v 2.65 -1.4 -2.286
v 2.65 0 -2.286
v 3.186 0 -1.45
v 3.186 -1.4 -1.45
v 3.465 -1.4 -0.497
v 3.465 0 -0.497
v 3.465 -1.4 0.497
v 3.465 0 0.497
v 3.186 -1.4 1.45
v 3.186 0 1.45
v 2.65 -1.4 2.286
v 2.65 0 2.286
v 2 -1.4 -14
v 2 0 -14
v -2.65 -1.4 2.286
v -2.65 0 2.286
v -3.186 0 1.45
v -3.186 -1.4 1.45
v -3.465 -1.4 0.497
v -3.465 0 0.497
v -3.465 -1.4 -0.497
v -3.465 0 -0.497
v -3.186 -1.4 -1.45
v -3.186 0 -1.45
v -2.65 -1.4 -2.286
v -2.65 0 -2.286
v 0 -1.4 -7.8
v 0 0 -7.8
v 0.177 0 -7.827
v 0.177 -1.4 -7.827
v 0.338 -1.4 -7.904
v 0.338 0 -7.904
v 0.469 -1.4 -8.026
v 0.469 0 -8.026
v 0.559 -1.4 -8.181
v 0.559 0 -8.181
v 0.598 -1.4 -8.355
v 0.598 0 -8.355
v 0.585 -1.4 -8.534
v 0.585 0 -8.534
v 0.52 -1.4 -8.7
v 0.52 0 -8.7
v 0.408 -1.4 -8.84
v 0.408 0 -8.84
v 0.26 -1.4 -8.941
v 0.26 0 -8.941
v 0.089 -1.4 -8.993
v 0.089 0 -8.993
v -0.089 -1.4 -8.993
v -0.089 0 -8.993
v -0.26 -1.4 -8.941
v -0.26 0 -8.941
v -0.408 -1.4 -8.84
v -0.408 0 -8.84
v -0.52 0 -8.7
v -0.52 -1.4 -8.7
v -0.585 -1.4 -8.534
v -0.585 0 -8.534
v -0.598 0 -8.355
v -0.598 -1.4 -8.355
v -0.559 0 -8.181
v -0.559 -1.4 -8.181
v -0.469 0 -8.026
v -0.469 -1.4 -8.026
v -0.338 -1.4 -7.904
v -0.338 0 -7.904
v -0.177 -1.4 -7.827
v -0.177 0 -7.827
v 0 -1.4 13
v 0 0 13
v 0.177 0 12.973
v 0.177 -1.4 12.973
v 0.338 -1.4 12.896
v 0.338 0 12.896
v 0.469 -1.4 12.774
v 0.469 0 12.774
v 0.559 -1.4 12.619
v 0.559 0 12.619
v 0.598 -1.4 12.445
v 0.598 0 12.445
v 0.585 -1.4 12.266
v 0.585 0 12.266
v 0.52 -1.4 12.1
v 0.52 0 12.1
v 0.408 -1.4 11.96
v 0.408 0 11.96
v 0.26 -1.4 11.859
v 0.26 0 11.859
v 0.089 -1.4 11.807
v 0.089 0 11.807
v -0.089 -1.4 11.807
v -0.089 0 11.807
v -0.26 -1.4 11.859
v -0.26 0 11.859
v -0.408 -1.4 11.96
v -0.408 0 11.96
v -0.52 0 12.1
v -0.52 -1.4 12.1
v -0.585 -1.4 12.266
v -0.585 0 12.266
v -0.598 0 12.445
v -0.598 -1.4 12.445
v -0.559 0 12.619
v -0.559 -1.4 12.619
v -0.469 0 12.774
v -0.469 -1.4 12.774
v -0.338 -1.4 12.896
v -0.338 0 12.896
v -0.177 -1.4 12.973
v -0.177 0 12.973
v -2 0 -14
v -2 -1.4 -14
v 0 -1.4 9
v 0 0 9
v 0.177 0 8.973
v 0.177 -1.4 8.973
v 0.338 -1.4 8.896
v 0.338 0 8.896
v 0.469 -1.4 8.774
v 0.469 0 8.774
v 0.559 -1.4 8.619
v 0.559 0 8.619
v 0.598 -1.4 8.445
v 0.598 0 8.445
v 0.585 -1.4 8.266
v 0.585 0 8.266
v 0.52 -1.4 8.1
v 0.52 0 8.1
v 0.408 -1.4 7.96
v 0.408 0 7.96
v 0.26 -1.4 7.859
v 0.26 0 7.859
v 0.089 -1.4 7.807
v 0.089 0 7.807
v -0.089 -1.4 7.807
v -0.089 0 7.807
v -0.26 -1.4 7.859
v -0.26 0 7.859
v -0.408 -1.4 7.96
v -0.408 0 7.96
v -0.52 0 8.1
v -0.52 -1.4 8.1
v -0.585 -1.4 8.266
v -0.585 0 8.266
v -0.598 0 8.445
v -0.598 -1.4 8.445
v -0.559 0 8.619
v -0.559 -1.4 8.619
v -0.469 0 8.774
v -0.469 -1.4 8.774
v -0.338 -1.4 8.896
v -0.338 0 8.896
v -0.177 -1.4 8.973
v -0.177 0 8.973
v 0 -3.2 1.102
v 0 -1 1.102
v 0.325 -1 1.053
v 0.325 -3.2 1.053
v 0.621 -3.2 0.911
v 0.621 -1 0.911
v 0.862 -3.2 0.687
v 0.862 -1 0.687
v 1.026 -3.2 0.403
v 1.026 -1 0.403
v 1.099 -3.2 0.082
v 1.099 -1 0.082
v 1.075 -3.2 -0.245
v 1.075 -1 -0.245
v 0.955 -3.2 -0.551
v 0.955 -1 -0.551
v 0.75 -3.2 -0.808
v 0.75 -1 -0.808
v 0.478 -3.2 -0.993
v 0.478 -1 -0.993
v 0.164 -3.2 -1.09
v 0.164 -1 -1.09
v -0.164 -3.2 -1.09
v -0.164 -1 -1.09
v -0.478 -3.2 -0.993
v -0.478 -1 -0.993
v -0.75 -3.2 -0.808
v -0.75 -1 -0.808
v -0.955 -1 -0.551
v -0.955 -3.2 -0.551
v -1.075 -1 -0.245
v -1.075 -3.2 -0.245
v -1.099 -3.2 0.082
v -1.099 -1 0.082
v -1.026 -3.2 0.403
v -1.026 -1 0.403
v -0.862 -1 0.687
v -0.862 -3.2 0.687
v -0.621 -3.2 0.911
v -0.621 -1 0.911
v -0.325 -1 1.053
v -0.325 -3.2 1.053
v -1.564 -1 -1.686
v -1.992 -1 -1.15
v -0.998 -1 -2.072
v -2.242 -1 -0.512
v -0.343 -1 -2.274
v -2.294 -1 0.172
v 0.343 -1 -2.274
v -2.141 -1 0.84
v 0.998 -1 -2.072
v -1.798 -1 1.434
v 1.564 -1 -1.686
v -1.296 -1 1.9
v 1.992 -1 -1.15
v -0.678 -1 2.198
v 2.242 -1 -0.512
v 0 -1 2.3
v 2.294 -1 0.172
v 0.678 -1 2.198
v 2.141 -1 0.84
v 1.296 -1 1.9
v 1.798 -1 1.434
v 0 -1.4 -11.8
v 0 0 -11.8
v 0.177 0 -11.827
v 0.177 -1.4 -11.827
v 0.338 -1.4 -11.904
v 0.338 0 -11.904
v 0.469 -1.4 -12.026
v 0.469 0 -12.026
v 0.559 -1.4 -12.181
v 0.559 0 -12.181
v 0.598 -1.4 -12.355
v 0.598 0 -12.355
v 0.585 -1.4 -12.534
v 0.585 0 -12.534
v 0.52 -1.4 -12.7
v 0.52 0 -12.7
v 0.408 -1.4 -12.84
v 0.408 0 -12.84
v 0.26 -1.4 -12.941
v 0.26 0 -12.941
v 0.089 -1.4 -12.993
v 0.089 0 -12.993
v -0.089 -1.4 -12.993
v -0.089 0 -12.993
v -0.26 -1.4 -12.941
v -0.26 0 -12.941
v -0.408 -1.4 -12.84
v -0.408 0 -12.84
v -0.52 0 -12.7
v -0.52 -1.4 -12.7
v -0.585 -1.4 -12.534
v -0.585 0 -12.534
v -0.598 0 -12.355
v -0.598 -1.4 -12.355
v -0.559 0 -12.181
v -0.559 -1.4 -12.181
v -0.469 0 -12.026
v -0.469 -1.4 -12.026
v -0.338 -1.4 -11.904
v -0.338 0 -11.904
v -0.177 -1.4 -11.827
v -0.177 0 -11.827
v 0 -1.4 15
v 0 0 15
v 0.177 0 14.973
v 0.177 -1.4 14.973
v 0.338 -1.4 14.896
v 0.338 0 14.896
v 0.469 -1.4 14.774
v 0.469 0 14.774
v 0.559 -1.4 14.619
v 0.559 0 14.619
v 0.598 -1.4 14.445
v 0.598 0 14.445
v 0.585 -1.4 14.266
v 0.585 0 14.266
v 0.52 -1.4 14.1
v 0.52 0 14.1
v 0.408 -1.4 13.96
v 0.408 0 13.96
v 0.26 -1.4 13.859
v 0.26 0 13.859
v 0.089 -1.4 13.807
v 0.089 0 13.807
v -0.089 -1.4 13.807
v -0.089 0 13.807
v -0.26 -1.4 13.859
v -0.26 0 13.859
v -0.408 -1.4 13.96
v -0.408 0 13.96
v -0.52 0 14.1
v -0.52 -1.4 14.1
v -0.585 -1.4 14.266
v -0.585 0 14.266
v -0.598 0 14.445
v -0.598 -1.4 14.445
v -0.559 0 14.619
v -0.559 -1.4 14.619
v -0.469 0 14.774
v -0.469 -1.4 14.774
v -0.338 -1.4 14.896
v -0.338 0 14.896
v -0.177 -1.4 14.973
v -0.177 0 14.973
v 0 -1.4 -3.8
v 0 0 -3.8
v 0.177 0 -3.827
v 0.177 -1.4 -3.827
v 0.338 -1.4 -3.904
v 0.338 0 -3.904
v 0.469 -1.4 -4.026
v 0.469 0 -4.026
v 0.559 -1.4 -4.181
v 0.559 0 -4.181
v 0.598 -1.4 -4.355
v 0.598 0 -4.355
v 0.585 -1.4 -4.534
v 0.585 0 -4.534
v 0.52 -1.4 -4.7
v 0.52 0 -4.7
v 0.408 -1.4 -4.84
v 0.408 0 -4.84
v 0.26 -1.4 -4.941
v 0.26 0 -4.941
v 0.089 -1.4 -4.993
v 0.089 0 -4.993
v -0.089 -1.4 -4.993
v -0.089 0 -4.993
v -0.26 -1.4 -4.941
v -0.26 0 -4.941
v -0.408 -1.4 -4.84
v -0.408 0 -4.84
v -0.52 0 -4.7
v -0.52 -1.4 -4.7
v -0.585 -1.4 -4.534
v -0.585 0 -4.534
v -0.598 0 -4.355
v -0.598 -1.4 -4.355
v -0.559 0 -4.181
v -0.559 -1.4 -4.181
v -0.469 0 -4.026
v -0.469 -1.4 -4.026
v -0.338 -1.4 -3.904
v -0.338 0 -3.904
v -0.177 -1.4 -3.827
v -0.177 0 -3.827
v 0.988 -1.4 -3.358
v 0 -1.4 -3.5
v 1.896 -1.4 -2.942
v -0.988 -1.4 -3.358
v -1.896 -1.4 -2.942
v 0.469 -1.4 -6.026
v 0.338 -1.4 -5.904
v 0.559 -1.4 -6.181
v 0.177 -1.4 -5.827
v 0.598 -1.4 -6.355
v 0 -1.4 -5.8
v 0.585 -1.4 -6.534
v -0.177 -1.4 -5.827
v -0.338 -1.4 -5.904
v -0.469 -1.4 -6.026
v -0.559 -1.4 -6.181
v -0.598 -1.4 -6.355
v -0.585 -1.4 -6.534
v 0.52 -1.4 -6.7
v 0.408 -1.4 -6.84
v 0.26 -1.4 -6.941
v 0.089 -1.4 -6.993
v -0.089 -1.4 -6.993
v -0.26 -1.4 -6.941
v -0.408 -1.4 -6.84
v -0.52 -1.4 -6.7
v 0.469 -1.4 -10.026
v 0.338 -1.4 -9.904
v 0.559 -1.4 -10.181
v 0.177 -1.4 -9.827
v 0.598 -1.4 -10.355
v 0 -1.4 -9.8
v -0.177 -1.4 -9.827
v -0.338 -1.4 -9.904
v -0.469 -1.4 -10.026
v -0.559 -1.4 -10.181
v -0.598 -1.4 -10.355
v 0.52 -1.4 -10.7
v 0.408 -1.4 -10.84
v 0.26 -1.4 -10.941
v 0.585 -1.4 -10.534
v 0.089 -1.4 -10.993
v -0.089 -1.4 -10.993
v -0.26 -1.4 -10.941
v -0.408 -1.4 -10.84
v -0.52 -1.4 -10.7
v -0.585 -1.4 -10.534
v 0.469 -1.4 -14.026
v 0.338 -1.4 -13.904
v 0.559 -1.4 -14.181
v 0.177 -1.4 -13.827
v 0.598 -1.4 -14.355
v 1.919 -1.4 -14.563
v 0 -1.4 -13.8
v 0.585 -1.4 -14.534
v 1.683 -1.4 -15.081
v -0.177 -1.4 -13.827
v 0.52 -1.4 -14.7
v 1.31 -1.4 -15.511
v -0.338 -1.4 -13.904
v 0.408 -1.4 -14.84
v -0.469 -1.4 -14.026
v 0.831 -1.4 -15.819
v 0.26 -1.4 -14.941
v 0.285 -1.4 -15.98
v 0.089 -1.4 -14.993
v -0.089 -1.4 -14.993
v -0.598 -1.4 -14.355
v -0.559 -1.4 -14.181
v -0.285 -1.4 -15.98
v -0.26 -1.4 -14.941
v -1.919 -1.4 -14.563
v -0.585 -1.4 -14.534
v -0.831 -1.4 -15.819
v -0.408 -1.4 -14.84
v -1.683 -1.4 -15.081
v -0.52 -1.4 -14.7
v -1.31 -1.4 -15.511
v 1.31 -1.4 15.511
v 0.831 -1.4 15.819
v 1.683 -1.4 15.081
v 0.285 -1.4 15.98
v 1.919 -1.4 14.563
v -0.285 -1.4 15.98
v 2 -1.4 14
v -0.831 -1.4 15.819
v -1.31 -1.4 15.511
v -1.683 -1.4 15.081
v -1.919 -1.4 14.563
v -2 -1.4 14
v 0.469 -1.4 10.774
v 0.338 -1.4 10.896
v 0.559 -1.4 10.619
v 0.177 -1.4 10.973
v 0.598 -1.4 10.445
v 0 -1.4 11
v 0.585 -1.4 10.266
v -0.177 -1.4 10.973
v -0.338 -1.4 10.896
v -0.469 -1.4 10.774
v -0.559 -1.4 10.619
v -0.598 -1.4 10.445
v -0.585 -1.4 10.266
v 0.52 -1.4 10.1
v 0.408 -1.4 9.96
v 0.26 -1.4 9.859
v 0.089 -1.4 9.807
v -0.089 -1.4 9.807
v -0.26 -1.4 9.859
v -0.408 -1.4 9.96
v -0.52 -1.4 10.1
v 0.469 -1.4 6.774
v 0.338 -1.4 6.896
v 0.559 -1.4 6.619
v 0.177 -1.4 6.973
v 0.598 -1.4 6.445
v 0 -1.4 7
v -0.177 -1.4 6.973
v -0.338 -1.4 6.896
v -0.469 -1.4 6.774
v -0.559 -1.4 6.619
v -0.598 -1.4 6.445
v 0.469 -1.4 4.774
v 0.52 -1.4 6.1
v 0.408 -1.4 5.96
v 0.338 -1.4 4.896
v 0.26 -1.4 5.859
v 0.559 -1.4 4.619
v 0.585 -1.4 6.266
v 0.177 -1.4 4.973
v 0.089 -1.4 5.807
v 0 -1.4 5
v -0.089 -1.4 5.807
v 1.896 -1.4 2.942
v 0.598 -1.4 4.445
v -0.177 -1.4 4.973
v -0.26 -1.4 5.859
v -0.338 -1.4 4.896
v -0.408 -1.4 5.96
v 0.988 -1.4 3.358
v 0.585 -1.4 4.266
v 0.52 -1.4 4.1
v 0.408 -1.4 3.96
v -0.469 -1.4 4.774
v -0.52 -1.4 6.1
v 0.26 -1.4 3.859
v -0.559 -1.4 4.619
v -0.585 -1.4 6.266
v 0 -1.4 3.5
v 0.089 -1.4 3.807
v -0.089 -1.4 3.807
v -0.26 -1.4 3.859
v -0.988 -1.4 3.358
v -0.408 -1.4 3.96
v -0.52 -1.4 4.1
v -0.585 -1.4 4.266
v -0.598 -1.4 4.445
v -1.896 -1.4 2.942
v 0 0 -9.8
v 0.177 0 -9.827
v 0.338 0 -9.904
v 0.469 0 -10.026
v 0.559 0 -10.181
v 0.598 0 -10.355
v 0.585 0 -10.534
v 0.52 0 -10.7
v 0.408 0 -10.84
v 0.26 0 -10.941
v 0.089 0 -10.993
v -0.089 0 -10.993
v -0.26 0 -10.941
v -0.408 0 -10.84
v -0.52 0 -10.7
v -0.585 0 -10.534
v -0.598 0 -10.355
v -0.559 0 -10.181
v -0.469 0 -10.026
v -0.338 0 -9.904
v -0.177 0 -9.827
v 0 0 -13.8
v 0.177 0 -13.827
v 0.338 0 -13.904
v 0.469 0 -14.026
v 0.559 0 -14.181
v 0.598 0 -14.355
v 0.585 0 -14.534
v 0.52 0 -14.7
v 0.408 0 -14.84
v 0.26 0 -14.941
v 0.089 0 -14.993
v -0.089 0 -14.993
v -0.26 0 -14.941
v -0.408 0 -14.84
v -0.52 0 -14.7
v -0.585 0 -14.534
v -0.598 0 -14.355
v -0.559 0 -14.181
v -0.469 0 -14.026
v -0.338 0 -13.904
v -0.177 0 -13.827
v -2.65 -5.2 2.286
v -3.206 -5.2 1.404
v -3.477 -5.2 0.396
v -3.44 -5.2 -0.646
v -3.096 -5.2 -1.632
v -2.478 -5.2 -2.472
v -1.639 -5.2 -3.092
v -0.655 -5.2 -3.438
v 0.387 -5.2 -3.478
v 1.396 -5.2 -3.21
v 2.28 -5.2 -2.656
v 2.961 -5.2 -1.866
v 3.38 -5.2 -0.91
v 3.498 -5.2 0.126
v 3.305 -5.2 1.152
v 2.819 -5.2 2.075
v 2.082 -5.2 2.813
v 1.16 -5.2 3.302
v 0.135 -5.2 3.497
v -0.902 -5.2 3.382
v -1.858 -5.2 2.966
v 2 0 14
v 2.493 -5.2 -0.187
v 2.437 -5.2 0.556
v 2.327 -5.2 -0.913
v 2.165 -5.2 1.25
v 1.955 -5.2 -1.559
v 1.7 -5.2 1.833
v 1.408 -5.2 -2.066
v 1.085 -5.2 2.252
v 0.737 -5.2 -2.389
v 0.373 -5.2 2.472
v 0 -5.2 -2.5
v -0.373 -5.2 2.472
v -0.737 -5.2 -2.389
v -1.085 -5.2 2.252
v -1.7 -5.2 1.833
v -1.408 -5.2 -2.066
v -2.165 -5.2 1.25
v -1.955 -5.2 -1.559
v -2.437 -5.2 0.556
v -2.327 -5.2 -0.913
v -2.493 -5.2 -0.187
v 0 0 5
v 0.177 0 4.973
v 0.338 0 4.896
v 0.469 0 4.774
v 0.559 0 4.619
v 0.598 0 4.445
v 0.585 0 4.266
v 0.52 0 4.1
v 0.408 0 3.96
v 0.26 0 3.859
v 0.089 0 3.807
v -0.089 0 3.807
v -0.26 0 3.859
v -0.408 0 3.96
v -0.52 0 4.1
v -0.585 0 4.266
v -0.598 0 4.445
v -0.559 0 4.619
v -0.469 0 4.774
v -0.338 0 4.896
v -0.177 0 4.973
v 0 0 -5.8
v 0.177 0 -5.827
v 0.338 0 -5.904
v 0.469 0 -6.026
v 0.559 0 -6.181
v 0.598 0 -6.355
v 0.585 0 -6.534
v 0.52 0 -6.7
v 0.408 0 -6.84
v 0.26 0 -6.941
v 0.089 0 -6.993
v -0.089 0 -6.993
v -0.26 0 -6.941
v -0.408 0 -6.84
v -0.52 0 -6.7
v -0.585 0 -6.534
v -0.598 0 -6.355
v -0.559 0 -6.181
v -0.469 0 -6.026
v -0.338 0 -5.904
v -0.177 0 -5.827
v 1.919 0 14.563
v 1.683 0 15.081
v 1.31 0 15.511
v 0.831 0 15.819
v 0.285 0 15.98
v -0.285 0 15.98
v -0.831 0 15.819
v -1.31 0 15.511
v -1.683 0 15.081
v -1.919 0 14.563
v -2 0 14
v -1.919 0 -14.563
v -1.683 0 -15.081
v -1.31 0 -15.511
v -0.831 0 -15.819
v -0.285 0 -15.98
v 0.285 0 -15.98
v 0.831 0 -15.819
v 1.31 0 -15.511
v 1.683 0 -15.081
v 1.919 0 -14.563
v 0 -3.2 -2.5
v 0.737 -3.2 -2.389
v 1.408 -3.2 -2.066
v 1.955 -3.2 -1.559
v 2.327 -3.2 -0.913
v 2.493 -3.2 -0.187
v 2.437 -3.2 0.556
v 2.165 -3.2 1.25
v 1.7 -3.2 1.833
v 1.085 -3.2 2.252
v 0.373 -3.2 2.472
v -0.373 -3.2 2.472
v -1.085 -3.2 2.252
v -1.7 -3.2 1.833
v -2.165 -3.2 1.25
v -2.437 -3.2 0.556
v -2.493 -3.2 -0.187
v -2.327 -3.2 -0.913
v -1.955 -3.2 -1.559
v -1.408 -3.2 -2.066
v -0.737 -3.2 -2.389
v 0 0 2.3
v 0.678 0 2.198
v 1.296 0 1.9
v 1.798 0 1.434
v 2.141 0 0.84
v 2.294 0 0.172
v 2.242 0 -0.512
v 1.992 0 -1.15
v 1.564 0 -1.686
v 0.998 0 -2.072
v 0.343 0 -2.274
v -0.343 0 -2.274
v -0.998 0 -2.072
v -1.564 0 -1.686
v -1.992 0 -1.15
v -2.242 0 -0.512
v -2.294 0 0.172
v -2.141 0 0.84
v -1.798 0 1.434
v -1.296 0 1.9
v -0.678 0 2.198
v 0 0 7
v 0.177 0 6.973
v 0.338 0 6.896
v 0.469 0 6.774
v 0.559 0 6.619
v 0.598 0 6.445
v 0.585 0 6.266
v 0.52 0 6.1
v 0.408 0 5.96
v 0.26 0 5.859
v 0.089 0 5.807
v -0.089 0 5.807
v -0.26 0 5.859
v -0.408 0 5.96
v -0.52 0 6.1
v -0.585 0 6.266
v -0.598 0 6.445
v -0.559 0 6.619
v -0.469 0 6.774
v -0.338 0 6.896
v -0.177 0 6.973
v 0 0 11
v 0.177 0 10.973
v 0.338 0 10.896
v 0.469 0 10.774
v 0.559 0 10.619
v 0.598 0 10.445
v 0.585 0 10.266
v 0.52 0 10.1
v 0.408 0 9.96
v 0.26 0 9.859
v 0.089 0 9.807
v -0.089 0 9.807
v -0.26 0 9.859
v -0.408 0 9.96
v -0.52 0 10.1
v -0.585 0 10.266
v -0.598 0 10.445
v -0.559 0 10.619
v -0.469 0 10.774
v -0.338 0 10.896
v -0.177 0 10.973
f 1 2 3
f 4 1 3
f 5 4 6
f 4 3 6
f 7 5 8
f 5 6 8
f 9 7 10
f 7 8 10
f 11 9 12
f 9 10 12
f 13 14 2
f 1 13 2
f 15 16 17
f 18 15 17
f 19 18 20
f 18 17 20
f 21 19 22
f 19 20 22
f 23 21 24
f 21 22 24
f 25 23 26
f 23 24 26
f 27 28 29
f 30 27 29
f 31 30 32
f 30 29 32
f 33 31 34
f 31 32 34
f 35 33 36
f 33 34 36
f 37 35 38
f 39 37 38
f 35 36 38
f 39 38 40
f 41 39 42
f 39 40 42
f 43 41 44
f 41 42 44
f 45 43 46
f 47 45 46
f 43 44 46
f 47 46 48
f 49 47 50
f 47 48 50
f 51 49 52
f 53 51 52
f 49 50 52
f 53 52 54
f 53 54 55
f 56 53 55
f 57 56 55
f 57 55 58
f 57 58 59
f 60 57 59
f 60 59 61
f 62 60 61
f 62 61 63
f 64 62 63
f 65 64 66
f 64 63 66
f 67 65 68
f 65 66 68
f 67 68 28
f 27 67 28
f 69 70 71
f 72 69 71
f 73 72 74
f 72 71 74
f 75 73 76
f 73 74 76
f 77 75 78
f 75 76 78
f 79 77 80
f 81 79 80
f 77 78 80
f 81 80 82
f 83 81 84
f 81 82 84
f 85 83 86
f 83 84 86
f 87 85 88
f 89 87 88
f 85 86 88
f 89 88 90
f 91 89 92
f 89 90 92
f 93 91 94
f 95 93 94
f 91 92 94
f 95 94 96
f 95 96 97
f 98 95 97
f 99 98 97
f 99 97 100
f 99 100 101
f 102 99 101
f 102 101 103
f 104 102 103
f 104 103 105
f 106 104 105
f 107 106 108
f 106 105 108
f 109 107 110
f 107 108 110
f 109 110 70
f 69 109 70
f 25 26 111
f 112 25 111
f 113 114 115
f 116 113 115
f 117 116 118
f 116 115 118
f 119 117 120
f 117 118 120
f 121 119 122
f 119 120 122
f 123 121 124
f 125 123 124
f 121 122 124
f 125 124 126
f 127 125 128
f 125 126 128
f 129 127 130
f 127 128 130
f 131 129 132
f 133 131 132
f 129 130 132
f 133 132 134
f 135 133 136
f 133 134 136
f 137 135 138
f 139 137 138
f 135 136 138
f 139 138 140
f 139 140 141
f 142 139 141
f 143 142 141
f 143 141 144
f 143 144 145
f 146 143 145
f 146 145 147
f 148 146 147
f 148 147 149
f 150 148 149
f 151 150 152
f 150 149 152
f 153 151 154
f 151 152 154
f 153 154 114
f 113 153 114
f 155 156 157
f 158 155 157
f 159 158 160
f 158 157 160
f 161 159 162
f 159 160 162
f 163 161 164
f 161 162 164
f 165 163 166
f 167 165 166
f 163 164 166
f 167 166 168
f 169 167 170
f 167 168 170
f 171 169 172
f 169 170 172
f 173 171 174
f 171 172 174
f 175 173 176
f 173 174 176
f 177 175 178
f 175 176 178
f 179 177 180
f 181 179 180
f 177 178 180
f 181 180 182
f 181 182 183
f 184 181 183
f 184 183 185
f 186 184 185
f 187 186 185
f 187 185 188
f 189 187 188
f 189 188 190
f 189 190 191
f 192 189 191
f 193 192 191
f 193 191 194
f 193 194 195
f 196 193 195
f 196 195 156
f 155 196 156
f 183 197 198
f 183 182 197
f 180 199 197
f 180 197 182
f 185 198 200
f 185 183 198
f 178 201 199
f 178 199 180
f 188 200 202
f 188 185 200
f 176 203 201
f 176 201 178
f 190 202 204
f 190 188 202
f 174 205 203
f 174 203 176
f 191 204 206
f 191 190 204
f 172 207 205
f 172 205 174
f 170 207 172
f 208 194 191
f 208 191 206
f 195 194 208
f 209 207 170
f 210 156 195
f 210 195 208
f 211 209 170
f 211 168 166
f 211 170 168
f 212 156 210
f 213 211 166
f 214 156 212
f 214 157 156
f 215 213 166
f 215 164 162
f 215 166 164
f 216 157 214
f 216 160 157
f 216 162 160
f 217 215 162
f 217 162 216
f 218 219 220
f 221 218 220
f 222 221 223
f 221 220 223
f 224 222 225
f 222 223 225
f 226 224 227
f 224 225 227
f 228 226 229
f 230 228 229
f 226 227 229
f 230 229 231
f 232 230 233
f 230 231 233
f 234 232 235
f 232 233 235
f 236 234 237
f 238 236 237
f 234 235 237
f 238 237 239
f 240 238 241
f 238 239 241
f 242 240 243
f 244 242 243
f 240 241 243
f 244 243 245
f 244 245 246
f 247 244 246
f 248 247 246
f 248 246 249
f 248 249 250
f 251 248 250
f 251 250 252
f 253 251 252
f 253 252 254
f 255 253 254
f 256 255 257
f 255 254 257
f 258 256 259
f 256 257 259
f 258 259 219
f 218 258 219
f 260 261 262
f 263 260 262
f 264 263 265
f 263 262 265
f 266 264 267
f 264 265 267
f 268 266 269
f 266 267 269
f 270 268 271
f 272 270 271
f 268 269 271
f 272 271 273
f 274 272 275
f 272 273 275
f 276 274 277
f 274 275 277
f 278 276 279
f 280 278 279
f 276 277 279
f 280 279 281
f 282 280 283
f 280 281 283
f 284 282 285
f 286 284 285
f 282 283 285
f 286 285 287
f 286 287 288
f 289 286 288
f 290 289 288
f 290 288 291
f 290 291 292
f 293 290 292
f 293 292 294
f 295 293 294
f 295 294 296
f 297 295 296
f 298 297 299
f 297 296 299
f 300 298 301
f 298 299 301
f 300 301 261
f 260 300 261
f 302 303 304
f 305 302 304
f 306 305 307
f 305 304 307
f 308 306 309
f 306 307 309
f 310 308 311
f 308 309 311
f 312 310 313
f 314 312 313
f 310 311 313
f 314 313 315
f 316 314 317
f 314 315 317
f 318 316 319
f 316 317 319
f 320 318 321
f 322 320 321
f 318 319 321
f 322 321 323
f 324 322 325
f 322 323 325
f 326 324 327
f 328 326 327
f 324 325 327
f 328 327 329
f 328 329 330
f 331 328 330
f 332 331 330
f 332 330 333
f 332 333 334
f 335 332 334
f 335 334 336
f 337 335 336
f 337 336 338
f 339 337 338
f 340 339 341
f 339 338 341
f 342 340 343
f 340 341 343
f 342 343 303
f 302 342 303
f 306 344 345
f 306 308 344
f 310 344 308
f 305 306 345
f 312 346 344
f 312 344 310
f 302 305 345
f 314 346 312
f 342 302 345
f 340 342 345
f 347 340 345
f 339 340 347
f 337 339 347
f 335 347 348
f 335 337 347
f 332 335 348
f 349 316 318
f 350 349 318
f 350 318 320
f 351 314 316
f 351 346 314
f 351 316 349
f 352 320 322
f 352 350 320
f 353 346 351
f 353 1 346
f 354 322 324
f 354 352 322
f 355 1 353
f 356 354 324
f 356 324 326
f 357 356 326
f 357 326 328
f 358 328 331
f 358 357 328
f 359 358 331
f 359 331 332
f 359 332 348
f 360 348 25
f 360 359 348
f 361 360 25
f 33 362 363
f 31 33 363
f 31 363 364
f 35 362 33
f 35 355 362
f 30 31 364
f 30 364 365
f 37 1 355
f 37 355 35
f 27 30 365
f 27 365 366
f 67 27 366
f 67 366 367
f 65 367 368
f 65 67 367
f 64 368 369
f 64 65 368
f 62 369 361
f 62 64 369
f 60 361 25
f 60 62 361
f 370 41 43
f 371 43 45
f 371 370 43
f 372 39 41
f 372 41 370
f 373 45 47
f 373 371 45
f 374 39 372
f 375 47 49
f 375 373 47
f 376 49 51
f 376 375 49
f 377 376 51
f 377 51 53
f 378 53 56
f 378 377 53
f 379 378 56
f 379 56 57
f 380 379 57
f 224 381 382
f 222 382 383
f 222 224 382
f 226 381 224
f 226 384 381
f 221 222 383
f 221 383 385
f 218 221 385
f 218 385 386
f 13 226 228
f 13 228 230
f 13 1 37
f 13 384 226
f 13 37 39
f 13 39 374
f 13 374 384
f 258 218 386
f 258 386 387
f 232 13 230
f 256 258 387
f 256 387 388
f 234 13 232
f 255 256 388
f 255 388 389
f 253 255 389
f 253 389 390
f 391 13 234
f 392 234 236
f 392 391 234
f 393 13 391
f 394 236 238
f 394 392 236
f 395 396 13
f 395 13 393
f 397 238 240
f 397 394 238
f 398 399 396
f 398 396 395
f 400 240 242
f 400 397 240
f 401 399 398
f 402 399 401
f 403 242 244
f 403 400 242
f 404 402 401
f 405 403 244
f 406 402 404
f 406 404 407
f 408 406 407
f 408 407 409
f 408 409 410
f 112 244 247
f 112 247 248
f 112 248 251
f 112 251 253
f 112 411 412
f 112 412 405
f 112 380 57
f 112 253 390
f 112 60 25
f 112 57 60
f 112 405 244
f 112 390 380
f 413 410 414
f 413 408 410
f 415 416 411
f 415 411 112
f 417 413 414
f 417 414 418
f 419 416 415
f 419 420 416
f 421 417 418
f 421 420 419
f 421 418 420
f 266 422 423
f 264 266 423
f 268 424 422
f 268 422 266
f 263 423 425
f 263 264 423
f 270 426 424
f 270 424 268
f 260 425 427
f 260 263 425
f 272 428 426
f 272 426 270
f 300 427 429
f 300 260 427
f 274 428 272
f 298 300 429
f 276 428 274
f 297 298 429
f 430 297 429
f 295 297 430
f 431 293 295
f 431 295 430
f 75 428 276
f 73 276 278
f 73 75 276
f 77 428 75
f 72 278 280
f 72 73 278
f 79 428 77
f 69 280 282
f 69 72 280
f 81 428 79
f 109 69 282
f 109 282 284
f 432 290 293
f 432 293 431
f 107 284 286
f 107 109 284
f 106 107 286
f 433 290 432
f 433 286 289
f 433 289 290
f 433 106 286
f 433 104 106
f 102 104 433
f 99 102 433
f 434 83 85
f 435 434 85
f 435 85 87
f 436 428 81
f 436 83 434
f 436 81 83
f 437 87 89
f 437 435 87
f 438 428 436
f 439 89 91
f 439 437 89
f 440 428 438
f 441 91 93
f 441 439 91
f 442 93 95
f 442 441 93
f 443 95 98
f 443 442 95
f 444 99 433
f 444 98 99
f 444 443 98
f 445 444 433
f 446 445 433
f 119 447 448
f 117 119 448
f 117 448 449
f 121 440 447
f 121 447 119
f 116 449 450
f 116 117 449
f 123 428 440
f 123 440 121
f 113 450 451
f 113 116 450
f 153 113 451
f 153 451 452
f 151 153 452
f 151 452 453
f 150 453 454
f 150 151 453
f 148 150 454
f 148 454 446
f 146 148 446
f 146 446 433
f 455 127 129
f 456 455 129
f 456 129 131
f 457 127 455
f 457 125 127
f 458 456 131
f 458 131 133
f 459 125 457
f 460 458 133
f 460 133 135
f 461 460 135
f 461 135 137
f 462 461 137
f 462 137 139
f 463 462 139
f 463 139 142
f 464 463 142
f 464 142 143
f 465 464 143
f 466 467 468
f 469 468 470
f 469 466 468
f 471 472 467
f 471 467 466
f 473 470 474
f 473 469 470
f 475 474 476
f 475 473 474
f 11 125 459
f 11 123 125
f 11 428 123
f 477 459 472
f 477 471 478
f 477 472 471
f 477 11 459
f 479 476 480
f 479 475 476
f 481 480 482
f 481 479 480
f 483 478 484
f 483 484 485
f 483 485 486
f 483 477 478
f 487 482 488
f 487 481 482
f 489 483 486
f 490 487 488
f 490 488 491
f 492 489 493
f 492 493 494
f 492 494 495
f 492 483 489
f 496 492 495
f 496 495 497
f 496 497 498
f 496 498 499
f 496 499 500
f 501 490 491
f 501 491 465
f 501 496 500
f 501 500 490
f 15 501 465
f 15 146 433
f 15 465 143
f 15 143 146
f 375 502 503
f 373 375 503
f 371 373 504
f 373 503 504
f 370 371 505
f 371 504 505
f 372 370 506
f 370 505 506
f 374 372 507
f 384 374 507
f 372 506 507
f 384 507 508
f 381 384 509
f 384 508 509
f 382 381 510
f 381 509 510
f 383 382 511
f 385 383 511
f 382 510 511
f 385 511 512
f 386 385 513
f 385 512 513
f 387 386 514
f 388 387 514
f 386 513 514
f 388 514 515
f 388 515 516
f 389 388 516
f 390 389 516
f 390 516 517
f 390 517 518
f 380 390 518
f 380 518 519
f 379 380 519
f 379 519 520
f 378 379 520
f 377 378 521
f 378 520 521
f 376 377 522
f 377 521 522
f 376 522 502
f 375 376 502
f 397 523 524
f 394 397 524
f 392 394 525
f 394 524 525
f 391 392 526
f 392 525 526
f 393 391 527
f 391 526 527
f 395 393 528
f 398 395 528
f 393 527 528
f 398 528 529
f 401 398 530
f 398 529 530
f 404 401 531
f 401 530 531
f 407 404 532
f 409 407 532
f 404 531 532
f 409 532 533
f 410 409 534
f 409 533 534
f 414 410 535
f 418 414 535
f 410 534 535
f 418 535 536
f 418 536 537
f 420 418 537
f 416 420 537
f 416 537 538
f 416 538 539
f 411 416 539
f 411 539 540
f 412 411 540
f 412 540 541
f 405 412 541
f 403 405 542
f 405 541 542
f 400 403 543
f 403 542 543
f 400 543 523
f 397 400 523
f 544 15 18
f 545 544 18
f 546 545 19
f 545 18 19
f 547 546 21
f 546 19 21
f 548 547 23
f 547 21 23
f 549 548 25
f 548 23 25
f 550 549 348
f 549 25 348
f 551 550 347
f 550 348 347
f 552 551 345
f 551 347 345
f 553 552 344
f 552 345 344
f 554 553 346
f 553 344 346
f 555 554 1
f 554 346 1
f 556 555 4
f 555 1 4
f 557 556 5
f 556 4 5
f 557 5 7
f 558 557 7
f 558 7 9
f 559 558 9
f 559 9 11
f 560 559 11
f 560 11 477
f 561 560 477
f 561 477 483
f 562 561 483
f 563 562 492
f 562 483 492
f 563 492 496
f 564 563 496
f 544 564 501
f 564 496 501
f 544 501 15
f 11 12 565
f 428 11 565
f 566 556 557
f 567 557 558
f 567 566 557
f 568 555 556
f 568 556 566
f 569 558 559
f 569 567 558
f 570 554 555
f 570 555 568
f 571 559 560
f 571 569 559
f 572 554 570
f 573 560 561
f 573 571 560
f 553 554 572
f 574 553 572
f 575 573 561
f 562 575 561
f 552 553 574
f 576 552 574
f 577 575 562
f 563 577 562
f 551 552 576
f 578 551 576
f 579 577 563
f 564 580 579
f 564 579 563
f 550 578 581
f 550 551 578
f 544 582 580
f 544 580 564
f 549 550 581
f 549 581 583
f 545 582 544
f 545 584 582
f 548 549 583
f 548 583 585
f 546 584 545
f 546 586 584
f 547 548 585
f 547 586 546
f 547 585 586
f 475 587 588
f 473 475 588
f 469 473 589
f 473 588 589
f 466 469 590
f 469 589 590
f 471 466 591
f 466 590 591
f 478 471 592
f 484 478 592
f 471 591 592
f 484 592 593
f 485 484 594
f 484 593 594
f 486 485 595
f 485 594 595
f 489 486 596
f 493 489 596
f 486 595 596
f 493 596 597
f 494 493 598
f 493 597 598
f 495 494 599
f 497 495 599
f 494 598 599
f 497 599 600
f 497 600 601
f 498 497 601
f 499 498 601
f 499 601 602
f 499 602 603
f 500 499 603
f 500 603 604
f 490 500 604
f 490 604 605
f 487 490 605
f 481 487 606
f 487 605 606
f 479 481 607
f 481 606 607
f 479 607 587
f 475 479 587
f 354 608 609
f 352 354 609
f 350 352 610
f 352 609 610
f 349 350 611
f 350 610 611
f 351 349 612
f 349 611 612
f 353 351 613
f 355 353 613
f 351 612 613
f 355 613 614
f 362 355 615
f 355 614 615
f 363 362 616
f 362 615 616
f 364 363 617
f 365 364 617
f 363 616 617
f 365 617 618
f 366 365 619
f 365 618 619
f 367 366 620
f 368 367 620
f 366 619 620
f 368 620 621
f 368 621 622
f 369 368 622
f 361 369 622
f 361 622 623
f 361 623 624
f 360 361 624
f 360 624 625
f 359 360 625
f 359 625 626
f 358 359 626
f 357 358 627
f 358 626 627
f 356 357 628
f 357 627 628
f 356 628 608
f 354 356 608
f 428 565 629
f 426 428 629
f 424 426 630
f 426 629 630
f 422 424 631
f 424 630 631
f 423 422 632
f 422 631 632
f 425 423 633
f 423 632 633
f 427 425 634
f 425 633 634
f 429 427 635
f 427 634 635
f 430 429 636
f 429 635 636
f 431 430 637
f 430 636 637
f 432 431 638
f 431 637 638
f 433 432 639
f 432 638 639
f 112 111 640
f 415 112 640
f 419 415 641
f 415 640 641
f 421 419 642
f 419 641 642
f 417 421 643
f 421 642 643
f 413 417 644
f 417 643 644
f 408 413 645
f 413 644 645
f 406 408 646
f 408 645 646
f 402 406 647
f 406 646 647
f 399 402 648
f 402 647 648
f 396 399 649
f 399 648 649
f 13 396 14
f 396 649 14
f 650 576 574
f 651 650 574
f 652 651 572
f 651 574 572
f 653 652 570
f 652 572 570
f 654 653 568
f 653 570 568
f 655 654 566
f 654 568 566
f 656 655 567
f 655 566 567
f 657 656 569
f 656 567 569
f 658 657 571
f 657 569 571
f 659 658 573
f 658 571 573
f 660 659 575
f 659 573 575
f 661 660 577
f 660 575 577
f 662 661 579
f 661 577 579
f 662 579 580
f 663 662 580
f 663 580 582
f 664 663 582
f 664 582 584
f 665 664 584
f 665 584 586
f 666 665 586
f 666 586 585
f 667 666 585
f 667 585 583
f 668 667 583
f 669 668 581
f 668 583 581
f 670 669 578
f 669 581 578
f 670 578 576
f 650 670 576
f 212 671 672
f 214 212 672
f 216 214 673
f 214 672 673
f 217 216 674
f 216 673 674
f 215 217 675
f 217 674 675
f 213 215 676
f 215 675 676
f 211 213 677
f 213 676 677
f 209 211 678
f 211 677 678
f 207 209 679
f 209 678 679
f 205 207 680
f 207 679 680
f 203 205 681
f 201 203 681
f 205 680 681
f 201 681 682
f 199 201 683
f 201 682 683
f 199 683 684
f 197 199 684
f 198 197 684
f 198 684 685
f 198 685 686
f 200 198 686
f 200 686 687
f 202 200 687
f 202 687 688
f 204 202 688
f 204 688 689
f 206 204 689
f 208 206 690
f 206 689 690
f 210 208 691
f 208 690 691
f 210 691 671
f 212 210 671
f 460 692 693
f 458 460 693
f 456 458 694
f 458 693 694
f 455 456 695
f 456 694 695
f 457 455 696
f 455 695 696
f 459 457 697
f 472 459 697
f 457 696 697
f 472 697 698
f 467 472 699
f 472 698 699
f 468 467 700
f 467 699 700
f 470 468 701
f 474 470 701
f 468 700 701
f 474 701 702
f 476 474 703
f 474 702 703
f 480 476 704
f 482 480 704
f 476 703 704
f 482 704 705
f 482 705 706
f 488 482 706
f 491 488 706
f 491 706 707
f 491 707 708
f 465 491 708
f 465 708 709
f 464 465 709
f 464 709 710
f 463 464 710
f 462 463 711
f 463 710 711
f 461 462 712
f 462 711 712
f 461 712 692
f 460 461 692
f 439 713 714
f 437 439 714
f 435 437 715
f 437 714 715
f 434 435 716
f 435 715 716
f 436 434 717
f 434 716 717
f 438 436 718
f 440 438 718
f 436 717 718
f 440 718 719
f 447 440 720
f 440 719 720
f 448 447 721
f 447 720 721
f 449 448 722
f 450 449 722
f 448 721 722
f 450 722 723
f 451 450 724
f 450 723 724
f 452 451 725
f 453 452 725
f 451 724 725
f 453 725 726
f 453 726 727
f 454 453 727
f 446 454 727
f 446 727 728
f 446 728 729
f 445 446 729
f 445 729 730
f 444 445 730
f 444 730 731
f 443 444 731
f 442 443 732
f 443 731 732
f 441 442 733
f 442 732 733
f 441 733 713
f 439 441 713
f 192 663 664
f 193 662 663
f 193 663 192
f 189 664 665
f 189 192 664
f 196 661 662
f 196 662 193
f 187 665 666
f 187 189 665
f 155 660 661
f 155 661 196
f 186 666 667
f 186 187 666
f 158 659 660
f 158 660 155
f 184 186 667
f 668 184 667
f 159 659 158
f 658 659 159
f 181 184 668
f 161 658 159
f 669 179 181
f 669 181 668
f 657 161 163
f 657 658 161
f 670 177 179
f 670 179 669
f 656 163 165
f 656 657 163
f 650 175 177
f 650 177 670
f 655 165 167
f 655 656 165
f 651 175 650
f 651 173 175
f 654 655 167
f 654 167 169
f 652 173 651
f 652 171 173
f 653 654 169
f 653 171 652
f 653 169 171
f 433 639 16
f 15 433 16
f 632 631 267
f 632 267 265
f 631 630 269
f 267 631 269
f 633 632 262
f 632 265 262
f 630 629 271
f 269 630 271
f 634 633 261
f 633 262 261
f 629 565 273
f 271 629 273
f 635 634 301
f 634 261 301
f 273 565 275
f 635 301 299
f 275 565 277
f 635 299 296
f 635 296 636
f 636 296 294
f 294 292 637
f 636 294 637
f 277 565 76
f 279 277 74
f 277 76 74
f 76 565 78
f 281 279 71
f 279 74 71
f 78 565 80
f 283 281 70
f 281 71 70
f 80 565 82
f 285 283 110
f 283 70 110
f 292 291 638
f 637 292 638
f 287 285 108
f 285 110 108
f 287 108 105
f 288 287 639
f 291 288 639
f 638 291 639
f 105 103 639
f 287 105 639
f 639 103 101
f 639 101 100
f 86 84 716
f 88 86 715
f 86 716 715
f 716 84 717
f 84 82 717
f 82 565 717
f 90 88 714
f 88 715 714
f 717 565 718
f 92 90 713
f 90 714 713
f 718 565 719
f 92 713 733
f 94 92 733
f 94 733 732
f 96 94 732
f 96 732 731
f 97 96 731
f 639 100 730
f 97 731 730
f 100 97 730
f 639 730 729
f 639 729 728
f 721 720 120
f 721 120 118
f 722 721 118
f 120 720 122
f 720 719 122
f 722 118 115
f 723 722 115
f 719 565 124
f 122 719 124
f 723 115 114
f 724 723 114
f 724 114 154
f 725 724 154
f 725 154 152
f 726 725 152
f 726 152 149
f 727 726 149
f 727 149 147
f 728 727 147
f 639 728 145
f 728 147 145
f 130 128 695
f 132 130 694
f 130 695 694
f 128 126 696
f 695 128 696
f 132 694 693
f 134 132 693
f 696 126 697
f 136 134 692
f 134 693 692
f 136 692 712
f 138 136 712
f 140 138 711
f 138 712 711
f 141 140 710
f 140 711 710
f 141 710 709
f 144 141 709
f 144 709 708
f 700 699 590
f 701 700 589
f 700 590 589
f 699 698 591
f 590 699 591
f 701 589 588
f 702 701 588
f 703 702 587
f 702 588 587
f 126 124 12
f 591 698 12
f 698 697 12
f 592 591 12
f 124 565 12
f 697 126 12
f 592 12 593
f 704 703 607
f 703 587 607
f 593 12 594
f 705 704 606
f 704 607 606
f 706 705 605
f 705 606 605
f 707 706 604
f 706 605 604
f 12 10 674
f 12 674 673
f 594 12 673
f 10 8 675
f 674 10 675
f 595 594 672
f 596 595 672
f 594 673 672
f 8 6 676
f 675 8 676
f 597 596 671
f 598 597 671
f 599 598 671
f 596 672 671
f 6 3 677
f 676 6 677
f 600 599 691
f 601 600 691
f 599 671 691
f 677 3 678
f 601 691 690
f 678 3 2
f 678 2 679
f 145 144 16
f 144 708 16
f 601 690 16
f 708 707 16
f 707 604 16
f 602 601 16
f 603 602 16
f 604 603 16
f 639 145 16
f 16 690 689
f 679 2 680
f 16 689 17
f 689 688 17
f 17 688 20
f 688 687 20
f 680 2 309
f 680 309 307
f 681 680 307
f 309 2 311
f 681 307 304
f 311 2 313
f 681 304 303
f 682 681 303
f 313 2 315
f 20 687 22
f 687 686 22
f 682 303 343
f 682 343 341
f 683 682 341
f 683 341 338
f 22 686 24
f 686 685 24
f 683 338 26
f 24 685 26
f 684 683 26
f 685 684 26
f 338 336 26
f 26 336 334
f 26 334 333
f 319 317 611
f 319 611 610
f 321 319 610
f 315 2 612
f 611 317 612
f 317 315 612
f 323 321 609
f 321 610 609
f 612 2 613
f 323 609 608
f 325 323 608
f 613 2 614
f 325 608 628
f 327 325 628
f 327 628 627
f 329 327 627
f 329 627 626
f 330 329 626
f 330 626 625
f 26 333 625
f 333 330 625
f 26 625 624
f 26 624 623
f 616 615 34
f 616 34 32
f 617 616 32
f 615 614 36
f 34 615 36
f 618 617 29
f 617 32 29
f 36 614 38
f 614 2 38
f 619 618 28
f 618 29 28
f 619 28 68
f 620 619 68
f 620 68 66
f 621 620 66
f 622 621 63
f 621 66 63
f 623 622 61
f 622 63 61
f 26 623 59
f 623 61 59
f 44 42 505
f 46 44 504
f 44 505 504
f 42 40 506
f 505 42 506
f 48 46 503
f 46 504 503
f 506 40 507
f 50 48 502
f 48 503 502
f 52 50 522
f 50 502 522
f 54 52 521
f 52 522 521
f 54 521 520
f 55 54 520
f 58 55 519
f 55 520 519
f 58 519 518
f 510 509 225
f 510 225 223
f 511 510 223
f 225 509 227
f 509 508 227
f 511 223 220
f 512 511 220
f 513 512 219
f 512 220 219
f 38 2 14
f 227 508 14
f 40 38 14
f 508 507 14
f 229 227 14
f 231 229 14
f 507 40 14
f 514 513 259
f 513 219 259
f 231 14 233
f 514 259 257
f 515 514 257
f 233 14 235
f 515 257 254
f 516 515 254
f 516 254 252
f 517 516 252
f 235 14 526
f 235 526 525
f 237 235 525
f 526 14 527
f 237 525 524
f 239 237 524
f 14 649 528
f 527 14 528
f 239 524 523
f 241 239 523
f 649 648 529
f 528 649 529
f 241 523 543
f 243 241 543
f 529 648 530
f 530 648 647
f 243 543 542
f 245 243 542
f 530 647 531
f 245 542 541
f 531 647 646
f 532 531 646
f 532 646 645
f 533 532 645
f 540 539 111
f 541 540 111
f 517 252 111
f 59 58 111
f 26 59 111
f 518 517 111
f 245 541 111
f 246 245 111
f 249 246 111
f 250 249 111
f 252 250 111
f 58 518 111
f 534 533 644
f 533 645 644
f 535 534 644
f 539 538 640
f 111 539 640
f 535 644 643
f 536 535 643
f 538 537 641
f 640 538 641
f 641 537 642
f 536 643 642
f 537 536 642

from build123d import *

# Parameters (mm, degrees)
SKETCH1_R           = 0.6
BOSS_EXTRUDE1_DEPTH = 1.4
SKETCH2_R           = 3.5
BOSS_EXTRUDE2_DEPTH = 3.8
SKETCH3_R           = 2.3
CUT_EXTRUDE1_DEPTH  = 1
SKETCH4_R           = 2.5
CUT_EXTRUDE2_DEPTH  = 2
CUT_EXTRUDE3_REACH  = 18.908
SKETCH5_R           = 1.102182138


with BuildPart() as part:
    # Sketch1 → Boss-Extrude1 (new body)
    with BuildSketch(Plane(origin=(0, 0, 0), x_dir=(1, 0, 0), z_dir=(0, 1, 0))):
        with BuildLine():
            ThreePointArc((2.65, 2.286372673), (3.5, 0), (2.65, -2.286372673))
            Line((2.65, -2.286372673), (2, -14))
            ThreePointArc((2, -14), (0, -16), (-2, -14))
            Line((-2, -14), (-2.65, -2.286372673))
            ThreePointArc((-2.65, -2.286372673), (-3.5, 0), (-2.65, 2.286372673))
            Line((-2.65, 2.286372673), (-2, 14))
            ThreePointArc((-2, 14), (0, 16), (2, 14))
            Line((2, 14), (2.65, 2.286372673))
        make_face()
        with Locations(Location((0, -12.4, 0), (0, 0, 270))):
            Circle(SKETCH1_R, mode=Mode.SUBTRACT)
        with Locations(Location((0, -8.4, 0), (0, 0, 270))):
            Circle(SKETCH1_R, mode=Mode.SUBTRACT)
        with Locations(Location((0, -4.4, 0), (0, 0, 270))):
            Circle(SKETCH1_R, mode=Mode.SUBTRACT)
        with Locations(Location((0, 4.4, 0), (0, 0, 270))):
            Circle(SKETCH1_R, mode=Mode.SUBTRACT)
        with Locations(Location((0, 6.4, 0), (0, 0, 270))):
            Circle(SKETCH1_R, mode=Mode.SUBTRACT)
        with Locations(Location((0, 8.4, 0), (0, 0, 270))):
            Circle(SKETCH1_R, mode=Mode.SUBTRACT)
        with Locations(Location((0, 10.4, 0), (0, 0, 270))):
            Circle(SKETCH1_R, mode=Mode.SUBTRACT)
        with Locations(Location((0, 12.4, 0), (0, 0, 270))):
            Circle(SKETCH1_R, mode=Mode.SUBTRACT)
        with Locations(Location((0, 14.4, 0), (0, 0, 270))):
            Circle(SKETCH1_R, mode=Mode.SUBTRACT)
        with Locations(Location((0, -6.4, 0), (0, 0, 270))):
            Circle(SKETCH1_R, mode=Mode.SUBTRACT)
        with Locations(Location((0, -10.4, 0), (0, 0, 270))):
            Circle(SKETCH1_R, mode=Mode.SUBTRACT)
        with Locations(Location((0, -14.4, 0), (0, 0, 270))):
            Circle(SKETCH1_R, mode=Mode.SUBTRACT)
    extrude(amount=-BOSS_EXTRUDE1_DEPTH)

    # Sketch2 → Boss-Extrude2 (add)
    with BuildSketch(Plane(origin=(0, -1.4, 0), x_dir=(-1, 0, 0), z_dir=(0, -1, 0))):
        with Locations(Location((0, 0, 0), (0, 0, 319.212961807))):
            Circle(SKETCH2_R)
    extrude(amount=BOSS_EXTRUDE2_DEPTH)

    # Sketch3 → Cut-Extrude1 (cut)
    with BuildSketch(Plane(origin=(0, 0, 0), x_dir=(1, 0, 0), z_dir=(0, 1, 0))):
        with Locations(Location((0, 0, 0), (0, 0, 270))):
            Circle(SKETCH3_R)
    extrude(amount=-CUT_EXTRUDE1_DEPTH, mode=Mode.SUBTRACT)

    # Sketch4 → Cut-Extrude2 (cut)
    with BuildSketch(Plane(origin=(0, -5.2, 0), x_dir=(-1, 0, 0), z_dir=(0, -1, 0))):
        with Locations(Location((0, 0, 0), (0, 0, 90))):
            Circle(SKETCH4_R)
    extrude(amount=-CUT_EXTRUDE2_DEPTH, mode=Mode.SUBTRACT)

    # Sketch5 → Cut-Extrude3 (cut, up to next)
    with BuildSketch(Plane(origin=(0, -1, 0), x_dir=(1, 0, 0), z_dir=(0, 1, 0)), mode=Mode.PRIVATE) as cut_extrude3_sk1:
        with Locations(Location((0, 0, 0), (0, 0, 270))):
            Circle(SKETCH5_R)
    cut_extrude3_tool1 = extrude(cut_extrude3_sk1.sketch, amount=-CUT_EXTRUDE3_REACH, mode=Mode.PRIVATE) & part.part
    add(cut_extrude3_tool1.solids().sort_by_distance((0, -1, 0))[0], mode=Mode.SUBTRACT)


solid = part.part
